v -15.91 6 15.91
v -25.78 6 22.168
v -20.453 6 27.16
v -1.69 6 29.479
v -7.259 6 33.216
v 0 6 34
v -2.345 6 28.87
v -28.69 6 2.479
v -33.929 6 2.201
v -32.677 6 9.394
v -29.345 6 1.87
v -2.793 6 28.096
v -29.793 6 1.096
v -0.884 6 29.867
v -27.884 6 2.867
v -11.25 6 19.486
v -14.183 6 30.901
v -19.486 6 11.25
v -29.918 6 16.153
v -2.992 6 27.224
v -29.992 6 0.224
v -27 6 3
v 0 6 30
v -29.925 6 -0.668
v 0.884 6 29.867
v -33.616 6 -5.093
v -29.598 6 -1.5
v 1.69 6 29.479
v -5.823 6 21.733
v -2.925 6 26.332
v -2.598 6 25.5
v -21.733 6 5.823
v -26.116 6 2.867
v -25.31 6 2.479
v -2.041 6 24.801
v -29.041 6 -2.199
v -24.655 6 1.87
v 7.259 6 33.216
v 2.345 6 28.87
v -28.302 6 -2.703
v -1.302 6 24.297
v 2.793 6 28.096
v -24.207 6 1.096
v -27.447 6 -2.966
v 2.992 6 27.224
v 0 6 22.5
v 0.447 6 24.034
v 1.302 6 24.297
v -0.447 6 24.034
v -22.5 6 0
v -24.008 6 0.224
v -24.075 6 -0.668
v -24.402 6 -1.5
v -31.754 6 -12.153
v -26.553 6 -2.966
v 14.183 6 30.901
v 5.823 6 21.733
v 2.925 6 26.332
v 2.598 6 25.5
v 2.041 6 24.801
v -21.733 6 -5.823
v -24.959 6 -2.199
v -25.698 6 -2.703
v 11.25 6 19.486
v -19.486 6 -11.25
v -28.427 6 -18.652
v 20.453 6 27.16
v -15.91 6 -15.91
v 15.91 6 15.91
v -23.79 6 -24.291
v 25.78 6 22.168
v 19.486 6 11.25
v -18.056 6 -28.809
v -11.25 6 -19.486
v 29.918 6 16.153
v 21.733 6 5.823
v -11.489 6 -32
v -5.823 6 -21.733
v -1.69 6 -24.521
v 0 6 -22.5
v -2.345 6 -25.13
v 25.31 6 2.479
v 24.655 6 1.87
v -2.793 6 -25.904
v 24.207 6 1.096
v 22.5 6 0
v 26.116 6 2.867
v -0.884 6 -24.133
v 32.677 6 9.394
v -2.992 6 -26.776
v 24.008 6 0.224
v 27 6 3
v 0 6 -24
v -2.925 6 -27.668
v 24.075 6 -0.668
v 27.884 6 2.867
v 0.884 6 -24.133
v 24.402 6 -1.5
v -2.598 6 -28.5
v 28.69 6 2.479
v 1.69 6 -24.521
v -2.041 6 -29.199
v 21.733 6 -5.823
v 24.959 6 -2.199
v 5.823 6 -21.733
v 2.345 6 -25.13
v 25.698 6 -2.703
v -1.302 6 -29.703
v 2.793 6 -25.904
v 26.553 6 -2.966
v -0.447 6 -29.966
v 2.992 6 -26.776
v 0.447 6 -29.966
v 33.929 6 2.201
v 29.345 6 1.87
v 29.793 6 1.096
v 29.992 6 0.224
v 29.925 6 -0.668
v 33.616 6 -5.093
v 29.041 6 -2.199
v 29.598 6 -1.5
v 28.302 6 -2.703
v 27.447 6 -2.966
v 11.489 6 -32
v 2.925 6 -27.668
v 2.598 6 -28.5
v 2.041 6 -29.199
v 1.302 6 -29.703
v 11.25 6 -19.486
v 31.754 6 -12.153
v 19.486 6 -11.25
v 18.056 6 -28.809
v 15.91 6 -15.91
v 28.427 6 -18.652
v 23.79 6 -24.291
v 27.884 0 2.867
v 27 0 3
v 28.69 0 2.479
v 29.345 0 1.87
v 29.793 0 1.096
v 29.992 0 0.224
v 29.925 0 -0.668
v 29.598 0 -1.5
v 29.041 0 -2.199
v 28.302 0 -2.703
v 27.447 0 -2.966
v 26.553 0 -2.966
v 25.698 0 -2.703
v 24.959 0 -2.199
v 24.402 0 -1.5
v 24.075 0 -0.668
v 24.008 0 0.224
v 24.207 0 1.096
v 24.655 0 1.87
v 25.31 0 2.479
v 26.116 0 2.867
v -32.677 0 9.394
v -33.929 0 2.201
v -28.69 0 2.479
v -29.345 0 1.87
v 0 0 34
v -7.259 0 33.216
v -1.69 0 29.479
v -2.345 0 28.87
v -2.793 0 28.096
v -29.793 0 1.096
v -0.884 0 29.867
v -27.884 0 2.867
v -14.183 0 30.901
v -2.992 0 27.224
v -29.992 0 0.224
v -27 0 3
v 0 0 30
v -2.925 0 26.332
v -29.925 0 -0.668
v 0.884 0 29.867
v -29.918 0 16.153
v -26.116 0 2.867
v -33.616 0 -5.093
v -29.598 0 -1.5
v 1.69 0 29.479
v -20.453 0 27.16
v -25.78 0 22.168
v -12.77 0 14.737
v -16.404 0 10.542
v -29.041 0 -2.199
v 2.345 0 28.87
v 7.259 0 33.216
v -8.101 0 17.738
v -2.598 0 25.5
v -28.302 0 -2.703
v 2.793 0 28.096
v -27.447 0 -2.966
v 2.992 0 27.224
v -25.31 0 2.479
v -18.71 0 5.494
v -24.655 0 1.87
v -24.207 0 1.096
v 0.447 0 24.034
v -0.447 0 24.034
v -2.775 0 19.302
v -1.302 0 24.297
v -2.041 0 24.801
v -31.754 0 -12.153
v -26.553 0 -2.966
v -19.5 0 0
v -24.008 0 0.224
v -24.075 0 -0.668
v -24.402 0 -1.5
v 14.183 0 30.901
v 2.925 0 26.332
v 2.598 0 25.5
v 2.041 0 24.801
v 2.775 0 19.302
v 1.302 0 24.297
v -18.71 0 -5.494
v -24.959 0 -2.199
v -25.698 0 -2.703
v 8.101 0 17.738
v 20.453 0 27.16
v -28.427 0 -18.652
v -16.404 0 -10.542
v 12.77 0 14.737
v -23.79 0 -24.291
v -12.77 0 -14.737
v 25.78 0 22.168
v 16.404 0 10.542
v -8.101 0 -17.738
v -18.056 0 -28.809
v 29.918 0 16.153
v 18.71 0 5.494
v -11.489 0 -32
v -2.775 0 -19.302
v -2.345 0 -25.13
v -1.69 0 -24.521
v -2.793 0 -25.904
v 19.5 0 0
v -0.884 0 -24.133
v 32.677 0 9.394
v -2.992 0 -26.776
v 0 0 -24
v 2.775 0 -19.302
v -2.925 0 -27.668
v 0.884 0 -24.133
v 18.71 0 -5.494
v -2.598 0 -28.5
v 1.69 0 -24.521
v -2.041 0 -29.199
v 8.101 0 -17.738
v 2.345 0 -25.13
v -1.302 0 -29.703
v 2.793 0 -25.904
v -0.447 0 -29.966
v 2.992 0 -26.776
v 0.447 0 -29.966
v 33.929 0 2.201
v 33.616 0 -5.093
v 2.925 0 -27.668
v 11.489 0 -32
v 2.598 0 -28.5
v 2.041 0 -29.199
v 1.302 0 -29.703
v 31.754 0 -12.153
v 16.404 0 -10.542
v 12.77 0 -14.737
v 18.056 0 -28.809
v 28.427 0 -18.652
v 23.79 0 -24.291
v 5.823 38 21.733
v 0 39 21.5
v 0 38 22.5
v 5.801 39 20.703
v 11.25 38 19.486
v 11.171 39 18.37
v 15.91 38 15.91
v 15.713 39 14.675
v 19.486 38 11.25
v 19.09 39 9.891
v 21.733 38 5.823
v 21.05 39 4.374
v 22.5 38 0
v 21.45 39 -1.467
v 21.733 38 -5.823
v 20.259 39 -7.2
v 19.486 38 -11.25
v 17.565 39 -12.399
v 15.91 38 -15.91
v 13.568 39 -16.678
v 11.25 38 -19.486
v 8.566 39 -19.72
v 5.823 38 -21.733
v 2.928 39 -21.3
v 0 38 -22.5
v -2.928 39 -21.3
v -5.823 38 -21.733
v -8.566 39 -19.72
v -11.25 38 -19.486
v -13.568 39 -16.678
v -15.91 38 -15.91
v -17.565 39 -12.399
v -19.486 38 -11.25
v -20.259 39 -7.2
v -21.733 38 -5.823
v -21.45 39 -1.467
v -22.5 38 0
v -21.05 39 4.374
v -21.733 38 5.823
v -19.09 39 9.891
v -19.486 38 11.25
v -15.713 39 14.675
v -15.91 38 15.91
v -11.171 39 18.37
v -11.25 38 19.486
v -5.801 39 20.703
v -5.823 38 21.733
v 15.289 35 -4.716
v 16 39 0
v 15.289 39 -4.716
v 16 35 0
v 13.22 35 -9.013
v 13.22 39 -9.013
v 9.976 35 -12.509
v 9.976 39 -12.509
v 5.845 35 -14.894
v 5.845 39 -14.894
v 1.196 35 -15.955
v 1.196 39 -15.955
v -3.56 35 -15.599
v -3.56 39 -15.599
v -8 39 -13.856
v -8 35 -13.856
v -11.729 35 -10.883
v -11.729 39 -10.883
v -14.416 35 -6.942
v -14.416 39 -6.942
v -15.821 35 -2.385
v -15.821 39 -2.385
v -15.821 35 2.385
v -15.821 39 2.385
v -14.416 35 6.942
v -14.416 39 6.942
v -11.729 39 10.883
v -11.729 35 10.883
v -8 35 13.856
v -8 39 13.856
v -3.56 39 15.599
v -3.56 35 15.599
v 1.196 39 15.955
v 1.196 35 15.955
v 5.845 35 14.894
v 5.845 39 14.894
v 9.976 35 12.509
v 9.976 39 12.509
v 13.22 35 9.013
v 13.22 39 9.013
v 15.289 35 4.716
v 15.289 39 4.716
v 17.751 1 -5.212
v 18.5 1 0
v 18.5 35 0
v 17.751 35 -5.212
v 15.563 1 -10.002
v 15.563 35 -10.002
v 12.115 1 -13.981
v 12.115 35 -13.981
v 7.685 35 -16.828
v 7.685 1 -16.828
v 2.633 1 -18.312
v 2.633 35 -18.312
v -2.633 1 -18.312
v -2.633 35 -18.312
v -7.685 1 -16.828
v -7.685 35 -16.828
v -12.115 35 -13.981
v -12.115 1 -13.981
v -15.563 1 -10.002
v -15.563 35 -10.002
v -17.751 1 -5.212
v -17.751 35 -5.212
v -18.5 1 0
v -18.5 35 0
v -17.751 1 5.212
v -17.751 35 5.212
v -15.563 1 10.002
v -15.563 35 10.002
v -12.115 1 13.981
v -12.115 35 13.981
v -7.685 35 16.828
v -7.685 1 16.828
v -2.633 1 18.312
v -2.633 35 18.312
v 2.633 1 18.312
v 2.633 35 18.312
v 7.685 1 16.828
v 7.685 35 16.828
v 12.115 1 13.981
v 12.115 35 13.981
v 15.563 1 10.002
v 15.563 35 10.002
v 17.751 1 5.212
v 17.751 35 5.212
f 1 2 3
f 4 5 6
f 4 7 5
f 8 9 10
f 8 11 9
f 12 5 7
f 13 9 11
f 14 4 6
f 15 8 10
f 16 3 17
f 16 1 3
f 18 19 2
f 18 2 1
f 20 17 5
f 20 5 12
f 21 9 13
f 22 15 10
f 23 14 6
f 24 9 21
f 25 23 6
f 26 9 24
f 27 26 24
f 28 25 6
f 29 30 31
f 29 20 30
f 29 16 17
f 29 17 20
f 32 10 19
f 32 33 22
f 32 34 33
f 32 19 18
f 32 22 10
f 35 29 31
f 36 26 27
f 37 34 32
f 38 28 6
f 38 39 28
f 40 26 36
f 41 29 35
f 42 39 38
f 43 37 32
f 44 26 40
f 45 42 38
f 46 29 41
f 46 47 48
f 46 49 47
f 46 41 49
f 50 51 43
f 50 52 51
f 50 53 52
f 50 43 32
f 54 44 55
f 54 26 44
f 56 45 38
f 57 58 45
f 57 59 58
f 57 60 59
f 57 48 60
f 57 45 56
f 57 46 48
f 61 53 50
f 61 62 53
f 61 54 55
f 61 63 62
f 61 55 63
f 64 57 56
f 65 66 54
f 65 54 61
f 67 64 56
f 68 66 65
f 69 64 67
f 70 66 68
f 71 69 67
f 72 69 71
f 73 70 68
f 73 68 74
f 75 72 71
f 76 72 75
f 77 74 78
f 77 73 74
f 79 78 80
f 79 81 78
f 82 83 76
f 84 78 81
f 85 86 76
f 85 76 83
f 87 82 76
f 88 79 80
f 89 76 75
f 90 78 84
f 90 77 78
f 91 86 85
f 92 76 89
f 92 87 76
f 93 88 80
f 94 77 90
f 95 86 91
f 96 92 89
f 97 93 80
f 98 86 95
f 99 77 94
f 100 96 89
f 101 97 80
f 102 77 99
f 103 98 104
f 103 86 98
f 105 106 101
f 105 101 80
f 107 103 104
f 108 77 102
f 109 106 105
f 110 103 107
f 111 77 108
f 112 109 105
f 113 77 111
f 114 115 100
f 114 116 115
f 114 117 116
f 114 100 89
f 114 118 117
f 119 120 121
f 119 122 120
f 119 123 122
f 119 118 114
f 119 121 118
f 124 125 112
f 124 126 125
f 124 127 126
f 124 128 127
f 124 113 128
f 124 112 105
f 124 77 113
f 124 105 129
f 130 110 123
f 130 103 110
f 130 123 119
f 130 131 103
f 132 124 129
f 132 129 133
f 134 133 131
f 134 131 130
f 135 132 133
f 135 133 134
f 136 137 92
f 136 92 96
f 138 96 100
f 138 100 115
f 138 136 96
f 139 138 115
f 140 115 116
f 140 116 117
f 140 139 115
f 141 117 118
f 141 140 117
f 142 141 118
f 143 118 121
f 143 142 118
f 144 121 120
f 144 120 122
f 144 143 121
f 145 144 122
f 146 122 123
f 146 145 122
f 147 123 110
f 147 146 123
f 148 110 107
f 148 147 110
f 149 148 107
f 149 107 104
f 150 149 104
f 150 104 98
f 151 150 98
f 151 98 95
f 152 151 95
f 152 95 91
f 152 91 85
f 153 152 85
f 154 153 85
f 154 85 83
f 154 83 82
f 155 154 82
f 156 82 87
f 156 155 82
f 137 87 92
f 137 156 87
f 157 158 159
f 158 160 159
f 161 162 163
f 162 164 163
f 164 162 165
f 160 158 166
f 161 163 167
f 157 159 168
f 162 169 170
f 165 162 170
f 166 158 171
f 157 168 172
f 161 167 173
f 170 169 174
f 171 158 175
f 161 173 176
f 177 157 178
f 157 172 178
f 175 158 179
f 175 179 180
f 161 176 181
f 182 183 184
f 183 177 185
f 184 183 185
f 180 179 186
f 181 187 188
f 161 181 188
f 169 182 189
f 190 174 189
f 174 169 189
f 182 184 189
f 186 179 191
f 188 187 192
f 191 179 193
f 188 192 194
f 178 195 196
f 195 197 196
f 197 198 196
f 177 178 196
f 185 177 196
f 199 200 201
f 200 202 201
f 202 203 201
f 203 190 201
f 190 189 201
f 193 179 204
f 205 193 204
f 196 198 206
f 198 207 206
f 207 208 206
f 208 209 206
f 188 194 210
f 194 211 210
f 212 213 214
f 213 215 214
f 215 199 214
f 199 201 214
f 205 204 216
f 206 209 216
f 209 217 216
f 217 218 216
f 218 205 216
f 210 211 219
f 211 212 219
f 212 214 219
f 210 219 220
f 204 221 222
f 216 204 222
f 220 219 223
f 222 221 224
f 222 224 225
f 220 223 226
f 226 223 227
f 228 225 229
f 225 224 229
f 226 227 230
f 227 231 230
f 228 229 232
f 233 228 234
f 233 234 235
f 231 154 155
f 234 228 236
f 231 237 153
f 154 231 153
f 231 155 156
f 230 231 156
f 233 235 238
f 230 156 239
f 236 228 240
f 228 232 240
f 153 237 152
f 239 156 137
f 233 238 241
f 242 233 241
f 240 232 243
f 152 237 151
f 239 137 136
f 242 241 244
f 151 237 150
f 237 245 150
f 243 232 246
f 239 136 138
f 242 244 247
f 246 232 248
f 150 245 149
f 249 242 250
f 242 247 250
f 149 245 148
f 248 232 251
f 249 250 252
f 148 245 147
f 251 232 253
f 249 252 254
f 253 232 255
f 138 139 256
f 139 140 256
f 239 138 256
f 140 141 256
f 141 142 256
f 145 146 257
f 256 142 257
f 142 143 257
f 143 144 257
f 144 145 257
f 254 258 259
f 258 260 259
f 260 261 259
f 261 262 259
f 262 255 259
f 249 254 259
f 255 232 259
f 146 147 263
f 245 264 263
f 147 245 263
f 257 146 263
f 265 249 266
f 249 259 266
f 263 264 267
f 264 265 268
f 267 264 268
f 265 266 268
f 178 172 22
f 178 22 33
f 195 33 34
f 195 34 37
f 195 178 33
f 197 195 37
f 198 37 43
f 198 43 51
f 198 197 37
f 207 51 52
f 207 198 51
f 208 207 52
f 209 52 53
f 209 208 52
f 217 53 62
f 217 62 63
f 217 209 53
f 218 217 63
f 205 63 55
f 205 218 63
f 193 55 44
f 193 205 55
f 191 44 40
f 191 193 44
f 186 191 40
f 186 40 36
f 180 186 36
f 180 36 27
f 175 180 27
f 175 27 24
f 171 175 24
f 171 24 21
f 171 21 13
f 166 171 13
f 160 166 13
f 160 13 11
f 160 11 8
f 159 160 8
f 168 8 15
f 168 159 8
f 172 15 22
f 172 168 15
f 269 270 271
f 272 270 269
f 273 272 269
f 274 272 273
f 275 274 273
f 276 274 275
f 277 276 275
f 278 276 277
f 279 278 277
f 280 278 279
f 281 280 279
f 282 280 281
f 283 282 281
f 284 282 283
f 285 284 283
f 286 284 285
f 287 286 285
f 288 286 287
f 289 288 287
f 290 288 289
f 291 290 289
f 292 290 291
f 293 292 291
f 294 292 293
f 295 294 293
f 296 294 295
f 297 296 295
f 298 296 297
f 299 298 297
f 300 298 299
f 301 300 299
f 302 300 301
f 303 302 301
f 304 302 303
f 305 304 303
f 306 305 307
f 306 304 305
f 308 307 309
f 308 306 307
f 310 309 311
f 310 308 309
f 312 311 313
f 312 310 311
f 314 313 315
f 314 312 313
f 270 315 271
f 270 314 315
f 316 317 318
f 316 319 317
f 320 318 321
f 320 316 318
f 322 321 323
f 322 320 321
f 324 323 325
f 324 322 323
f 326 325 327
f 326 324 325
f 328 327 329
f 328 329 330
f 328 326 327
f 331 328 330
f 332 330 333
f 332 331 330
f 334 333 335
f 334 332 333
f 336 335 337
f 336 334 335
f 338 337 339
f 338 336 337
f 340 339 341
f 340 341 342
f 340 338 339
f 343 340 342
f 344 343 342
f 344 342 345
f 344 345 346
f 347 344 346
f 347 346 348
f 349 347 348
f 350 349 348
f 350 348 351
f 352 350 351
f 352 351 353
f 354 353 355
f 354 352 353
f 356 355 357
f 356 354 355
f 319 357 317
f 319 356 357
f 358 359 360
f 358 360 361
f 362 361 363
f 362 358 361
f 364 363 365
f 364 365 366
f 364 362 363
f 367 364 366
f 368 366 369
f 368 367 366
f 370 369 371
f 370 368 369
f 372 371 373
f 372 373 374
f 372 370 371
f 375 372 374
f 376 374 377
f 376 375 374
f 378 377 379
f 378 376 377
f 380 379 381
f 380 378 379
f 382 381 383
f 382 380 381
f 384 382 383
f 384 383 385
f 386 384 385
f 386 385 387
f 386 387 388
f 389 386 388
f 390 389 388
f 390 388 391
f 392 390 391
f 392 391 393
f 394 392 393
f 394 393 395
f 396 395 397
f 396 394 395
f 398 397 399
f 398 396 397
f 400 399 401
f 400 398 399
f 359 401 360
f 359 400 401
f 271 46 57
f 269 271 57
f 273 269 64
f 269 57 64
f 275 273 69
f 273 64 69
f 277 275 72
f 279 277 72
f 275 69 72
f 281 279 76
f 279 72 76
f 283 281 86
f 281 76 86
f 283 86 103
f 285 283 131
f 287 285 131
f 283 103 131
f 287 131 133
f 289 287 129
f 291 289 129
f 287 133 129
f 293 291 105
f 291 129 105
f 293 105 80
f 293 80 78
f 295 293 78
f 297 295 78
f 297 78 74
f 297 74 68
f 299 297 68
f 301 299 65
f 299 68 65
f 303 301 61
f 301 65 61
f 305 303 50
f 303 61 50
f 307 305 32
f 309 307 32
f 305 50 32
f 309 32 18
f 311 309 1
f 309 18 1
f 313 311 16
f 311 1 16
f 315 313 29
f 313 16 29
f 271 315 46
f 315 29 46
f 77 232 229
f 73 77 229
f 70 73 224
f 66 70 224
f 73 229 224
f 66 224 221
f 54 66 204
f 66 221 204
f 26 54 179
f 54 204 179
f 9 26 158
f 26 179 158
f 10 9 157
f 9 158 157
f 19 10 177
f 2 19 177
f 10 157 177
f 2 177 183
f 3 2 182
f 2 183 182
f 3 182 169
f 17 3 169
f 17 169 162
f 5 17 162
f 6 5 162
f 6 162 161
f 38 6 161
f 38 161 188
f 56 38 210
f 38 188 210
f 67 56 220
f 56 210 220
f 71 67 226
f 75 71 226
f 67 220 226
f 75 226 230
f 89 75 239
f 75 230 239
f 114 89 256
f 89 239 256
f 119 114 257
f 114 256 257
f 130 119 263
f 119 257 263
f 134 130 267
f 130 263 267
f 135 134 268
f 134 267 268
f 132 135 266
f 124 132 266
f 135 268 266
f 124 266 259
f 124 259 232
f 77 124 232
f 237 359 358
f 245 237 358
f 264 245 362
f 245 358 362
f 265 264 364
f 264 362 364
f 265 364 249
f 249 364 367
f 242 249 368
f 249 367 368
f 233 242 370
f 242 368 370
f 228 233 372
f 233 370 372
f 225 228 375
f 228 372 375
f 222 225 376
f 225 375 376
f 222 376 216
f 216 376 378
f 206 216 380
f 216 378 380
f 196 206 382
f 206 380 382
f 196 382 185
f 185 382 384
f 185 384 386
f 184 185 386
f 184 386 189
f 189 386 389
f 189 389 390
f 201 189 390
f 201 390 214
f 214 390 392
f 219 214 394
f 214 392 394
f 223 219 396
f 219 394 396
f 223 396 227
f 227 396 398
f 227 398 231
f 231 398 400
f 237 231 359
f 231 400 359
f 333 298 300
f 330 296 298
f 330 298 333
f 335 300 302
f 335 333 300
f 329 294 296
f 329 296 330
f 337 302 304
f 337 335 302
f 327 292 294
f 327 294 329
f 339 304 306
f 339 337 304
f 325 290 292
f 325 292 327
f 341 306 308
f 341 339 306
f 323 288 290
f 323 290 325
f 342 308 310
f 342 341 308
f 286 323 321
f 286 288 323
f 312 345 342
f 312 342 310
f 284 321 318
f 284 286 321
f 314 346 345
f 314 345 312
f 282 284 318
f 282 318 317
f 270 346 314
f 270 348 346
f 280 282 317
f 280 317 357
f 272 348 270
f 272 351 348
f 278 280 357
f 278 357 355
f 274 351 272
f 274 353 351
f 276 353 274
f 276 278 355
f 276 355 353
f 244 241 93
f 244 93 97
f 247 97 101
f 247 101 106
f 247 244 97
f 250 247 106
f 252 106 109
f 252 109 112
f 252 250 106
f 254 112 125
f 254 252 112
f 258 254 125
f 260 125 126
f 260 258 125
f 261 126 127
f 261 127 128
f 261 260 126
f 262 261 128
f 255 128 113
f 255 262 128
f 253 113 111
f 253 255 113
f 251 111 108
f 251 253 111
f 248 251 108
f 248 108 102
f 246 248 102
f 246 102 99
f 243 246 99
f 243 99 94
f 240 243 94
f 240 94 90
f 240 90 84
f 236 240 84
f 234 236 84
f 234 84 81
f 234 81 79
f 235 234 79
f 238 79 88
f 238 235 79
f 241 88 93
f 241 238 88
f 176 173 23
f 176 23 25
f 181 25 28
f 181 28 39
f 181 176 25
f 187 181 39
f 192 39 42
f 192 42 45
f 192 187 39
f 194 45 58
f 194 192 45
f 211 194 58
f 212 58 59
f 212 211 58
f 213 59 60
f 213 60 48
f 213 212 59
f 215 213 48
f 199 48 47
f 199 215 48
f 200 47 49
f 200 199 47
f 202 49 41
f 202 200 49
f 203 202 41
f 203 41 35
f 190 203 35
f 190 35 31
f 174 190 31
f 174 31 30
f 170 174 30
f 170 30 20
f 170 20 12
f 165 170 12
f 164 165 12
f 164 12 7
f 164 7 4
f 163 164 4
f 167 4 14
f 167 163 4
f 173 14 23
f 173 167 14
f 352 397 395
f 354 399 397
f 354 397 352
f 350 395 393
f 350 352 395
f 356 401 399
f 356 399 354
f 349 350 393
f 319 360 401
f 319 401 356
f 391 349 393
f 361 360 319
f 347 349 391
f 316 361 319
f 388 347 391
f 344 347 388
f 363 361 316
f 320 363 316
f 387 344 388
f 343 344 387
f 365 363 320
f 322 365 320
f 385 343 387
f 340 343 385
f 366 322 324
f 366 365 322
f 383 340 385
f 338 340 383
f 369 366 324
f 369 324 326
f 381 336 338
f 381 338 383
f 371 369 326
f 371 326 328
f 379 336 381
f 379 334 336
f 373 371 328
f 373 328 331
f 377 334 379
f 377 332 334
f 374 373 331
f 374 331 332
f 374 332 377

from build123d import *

# Parameters (mm, degrees)
SKETCH_1_R      = 3
EXTRUDE_1_DEPTH = 6
SKETCH_2_R      = 22.5
EXTRUDE_2_DEPTH = 33
CHAMFER_1_SIZE  = 1


with BuildPart() as part:
    # 草图1 → 凸台-拉伸1 (new body)
    with BuildSketch(Plane(origin=(0, 0, 0), x_dir=(1, 0, 0), z_dir=(0, 1, 0))):
        with BuildLine():
            Line((11.489125293, 32), (-11.489125293, 32))
            ThreePointArc((-11.489125293, 32), (0, -34), (11.489125293, 32))
        make_face()
        with Locations(Location((0, 27, 0), (0, 0, 270))):
            Circle(SKETCH_1_R, mode=Mode.SUBTRACT)
        with Locations(Location((27, 0, 0), (0, 0, 270))):
            Circle(SKETCH_1_R, mode=Mode.SUBTRACT)
        with Locations(Location((0, -27, 0), (0, 0, 270))):
            Circle(SKETCH_1_R, mode=Mode.SUBTRACT)
        with Locations(Location((-27, 0, 0), (0, 0, 270))):
            Circle(SKETCH_1_R, mode=Mode.SUBTRACT)
    extrude(amount=EXTRUDE_1_DEPTH)

    # 草图2 → 凸台-拉伸2 (add)
    with BuildSketch(Plane(origin=(0, 6, 0), x_dir=(1, 0, 0), z_dir=(0, 1, 0))):
        with Locations(Location((0, 0, 0), (0, 0, 270))):
            Circle(SKETCH_2_R)
    extrude(amount=EXTRUDE_2_DEPTH)

    # 草图3 → 切除-旋转1 (revolve, cut)
    with BuildSketch(Plane.XY):
        Polygon((0, 39), (16, 39), (16, 35), (18.5, 35), (18.5, 0), (0, 0), align=None)
    revolve(axis=Axis((0, 0, 0), (0, 1, 0)), mode=Mode.SUBTRACT)

    # 倒角1
    chamfer_1_edges = [part.edges().sort_by_distance(p)[0] for p in [
        (0, 39, -22.5),
        (-18.5, 0, 0),
    ]]
    chamfer(chamfer_1_edges, length=CHAMFER_1_SIZE)


solid = part.part
